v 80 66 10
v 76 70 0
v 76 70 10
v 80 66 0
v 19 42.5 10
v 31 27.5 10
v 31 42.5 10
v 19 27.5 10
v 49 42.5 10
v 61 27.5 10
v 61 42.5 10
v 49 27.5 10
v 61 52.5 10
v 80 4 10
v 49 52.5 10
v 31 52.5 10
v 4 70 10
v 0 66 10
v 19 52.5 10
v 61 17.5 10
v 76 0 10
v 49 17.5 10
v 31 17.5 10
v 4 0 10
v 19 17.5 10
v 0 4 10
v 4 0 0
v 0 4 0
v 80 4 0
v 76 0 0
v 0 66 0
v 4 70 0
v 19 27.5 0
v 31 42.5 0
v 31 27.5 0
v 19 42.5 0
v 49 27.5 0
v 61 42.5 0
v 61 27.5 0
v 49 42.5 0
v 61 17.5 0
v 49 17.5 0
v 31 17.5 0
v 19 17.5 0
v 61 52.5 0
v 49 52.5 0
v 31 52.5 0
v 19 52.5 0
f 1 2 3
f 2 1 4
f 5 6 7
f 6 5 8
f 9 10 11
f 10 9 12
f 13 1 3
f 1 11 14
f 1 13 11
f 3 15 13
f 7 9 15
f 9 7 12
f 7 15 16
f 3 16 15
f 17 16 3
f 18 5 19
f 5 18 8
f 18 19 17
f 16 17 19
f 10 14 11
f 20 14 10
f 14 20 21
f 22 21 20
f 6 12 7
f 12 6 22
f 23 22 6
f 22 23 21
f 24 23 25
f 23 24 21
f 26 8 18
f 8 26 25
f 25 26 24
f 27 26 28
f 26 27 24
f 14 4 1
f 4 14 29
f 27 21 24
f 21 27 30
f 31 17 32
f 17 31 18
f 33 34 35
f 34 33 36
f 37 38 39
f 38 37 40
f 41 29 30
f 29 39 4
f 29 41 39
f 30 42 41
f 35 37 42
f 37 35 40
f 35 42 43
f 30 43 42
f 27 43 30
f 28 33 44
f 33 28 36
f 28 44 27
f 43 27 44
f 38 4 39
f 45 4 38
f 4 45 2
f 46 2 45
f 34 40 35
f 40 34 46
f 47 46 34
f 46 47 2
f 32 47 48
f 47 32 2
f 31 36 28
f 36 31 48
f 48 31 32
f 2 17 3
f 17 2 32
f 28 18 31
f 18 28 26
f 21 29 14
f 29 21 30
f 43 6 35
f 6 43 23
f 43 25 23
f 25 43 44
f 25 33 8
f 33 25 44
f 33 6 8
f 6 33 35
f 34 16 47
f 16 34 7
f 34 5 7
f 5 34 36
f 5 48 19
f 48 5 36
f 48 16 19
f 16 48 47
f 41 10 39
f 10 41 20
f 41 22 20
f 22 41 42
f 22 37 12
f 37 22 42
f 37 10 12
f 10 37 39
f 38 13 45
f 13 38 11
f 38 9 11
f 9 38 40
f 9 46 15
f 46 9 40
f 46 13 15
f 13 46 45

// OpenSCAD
$fn = 32;

// ----------------------------------------------------------------------
// Windowed plate: 4 voids, 80 x 70 x 10 mm
// ----------------------------------------------------------------------

// --- parameters (mm) ---
plate_l = 80;             // plate length, X
plate_w = 70;             // plate width, Y
plate_t = 10;             // plate thickness, Z
edge_margin = 10;         // wall from the plate edge to any window
win_l = 12;               // pocket length
win_w = 10;               // pocket width
pitch_x = 30;             // grid pitch along X
pitch_y = 25;             // grid pitch along Y
depth_1 = 10;             // depth of void 1 (full thickness = through)
depth_2 = 10;             // depth of void 2 (full thickness = through)
depth_3 = 10;             // depth of void 3 (full thickness = through)
depth_4 = 10;             // depth of void 4 (full thickness = through)
corner_c = 4;             // corner chamfer of the plate
fit_tol = 0.02;           // declared fit tolerance (prompt contract)
free_tol = 0.2;           // declared free tolerance (prompt contract)

profile = [[4, 0], [76, 0], [80, 4], [80, 66], [76, 70], [4, 70], [0, 66], [0, 4]];  // primary outline, 8 points, counter clockwise
void_1 = [[19, 17.5], [31, 17.5], [31, 27.5], [19, 27.5]];  // pocket at grid node 0,0, 4 points
void_2 = [[19, 42.5], [31, 42.5], [31, 52.5], [19, 52.5]];  // pocket at grid node 0,1, 4 points
void_3 = [[49, 17.5], [61, 17.5], [61, 27.5], [49, 27.5]];  // pocket at grid node 1,0, 4 points
void_4 = [[49, 42.5], [61, 42.5], [61, 52.5], [49, 52.5]];  // pocket at grid node 1,1, 4 points

// --- the one profile operation ---
difference() {
  linear_extrude(height = plate_t) polygon(points = profile);
  translate([0, 0, -1])
    linear_extrude(height = plate_t + 2) polygon(points = void_1);
  translate([0, 0, -1])
    linear_extrude(height = plate_t + 2) polygon(points = void_2);
  translate([0, 0, -1])
    linear_extrude(height = plate_t + 2) polygon(points = void_3);
  translate([0, 0, -1])
    linear_extrude(height = plate_t + 2) polygon(points = void_4);
}
